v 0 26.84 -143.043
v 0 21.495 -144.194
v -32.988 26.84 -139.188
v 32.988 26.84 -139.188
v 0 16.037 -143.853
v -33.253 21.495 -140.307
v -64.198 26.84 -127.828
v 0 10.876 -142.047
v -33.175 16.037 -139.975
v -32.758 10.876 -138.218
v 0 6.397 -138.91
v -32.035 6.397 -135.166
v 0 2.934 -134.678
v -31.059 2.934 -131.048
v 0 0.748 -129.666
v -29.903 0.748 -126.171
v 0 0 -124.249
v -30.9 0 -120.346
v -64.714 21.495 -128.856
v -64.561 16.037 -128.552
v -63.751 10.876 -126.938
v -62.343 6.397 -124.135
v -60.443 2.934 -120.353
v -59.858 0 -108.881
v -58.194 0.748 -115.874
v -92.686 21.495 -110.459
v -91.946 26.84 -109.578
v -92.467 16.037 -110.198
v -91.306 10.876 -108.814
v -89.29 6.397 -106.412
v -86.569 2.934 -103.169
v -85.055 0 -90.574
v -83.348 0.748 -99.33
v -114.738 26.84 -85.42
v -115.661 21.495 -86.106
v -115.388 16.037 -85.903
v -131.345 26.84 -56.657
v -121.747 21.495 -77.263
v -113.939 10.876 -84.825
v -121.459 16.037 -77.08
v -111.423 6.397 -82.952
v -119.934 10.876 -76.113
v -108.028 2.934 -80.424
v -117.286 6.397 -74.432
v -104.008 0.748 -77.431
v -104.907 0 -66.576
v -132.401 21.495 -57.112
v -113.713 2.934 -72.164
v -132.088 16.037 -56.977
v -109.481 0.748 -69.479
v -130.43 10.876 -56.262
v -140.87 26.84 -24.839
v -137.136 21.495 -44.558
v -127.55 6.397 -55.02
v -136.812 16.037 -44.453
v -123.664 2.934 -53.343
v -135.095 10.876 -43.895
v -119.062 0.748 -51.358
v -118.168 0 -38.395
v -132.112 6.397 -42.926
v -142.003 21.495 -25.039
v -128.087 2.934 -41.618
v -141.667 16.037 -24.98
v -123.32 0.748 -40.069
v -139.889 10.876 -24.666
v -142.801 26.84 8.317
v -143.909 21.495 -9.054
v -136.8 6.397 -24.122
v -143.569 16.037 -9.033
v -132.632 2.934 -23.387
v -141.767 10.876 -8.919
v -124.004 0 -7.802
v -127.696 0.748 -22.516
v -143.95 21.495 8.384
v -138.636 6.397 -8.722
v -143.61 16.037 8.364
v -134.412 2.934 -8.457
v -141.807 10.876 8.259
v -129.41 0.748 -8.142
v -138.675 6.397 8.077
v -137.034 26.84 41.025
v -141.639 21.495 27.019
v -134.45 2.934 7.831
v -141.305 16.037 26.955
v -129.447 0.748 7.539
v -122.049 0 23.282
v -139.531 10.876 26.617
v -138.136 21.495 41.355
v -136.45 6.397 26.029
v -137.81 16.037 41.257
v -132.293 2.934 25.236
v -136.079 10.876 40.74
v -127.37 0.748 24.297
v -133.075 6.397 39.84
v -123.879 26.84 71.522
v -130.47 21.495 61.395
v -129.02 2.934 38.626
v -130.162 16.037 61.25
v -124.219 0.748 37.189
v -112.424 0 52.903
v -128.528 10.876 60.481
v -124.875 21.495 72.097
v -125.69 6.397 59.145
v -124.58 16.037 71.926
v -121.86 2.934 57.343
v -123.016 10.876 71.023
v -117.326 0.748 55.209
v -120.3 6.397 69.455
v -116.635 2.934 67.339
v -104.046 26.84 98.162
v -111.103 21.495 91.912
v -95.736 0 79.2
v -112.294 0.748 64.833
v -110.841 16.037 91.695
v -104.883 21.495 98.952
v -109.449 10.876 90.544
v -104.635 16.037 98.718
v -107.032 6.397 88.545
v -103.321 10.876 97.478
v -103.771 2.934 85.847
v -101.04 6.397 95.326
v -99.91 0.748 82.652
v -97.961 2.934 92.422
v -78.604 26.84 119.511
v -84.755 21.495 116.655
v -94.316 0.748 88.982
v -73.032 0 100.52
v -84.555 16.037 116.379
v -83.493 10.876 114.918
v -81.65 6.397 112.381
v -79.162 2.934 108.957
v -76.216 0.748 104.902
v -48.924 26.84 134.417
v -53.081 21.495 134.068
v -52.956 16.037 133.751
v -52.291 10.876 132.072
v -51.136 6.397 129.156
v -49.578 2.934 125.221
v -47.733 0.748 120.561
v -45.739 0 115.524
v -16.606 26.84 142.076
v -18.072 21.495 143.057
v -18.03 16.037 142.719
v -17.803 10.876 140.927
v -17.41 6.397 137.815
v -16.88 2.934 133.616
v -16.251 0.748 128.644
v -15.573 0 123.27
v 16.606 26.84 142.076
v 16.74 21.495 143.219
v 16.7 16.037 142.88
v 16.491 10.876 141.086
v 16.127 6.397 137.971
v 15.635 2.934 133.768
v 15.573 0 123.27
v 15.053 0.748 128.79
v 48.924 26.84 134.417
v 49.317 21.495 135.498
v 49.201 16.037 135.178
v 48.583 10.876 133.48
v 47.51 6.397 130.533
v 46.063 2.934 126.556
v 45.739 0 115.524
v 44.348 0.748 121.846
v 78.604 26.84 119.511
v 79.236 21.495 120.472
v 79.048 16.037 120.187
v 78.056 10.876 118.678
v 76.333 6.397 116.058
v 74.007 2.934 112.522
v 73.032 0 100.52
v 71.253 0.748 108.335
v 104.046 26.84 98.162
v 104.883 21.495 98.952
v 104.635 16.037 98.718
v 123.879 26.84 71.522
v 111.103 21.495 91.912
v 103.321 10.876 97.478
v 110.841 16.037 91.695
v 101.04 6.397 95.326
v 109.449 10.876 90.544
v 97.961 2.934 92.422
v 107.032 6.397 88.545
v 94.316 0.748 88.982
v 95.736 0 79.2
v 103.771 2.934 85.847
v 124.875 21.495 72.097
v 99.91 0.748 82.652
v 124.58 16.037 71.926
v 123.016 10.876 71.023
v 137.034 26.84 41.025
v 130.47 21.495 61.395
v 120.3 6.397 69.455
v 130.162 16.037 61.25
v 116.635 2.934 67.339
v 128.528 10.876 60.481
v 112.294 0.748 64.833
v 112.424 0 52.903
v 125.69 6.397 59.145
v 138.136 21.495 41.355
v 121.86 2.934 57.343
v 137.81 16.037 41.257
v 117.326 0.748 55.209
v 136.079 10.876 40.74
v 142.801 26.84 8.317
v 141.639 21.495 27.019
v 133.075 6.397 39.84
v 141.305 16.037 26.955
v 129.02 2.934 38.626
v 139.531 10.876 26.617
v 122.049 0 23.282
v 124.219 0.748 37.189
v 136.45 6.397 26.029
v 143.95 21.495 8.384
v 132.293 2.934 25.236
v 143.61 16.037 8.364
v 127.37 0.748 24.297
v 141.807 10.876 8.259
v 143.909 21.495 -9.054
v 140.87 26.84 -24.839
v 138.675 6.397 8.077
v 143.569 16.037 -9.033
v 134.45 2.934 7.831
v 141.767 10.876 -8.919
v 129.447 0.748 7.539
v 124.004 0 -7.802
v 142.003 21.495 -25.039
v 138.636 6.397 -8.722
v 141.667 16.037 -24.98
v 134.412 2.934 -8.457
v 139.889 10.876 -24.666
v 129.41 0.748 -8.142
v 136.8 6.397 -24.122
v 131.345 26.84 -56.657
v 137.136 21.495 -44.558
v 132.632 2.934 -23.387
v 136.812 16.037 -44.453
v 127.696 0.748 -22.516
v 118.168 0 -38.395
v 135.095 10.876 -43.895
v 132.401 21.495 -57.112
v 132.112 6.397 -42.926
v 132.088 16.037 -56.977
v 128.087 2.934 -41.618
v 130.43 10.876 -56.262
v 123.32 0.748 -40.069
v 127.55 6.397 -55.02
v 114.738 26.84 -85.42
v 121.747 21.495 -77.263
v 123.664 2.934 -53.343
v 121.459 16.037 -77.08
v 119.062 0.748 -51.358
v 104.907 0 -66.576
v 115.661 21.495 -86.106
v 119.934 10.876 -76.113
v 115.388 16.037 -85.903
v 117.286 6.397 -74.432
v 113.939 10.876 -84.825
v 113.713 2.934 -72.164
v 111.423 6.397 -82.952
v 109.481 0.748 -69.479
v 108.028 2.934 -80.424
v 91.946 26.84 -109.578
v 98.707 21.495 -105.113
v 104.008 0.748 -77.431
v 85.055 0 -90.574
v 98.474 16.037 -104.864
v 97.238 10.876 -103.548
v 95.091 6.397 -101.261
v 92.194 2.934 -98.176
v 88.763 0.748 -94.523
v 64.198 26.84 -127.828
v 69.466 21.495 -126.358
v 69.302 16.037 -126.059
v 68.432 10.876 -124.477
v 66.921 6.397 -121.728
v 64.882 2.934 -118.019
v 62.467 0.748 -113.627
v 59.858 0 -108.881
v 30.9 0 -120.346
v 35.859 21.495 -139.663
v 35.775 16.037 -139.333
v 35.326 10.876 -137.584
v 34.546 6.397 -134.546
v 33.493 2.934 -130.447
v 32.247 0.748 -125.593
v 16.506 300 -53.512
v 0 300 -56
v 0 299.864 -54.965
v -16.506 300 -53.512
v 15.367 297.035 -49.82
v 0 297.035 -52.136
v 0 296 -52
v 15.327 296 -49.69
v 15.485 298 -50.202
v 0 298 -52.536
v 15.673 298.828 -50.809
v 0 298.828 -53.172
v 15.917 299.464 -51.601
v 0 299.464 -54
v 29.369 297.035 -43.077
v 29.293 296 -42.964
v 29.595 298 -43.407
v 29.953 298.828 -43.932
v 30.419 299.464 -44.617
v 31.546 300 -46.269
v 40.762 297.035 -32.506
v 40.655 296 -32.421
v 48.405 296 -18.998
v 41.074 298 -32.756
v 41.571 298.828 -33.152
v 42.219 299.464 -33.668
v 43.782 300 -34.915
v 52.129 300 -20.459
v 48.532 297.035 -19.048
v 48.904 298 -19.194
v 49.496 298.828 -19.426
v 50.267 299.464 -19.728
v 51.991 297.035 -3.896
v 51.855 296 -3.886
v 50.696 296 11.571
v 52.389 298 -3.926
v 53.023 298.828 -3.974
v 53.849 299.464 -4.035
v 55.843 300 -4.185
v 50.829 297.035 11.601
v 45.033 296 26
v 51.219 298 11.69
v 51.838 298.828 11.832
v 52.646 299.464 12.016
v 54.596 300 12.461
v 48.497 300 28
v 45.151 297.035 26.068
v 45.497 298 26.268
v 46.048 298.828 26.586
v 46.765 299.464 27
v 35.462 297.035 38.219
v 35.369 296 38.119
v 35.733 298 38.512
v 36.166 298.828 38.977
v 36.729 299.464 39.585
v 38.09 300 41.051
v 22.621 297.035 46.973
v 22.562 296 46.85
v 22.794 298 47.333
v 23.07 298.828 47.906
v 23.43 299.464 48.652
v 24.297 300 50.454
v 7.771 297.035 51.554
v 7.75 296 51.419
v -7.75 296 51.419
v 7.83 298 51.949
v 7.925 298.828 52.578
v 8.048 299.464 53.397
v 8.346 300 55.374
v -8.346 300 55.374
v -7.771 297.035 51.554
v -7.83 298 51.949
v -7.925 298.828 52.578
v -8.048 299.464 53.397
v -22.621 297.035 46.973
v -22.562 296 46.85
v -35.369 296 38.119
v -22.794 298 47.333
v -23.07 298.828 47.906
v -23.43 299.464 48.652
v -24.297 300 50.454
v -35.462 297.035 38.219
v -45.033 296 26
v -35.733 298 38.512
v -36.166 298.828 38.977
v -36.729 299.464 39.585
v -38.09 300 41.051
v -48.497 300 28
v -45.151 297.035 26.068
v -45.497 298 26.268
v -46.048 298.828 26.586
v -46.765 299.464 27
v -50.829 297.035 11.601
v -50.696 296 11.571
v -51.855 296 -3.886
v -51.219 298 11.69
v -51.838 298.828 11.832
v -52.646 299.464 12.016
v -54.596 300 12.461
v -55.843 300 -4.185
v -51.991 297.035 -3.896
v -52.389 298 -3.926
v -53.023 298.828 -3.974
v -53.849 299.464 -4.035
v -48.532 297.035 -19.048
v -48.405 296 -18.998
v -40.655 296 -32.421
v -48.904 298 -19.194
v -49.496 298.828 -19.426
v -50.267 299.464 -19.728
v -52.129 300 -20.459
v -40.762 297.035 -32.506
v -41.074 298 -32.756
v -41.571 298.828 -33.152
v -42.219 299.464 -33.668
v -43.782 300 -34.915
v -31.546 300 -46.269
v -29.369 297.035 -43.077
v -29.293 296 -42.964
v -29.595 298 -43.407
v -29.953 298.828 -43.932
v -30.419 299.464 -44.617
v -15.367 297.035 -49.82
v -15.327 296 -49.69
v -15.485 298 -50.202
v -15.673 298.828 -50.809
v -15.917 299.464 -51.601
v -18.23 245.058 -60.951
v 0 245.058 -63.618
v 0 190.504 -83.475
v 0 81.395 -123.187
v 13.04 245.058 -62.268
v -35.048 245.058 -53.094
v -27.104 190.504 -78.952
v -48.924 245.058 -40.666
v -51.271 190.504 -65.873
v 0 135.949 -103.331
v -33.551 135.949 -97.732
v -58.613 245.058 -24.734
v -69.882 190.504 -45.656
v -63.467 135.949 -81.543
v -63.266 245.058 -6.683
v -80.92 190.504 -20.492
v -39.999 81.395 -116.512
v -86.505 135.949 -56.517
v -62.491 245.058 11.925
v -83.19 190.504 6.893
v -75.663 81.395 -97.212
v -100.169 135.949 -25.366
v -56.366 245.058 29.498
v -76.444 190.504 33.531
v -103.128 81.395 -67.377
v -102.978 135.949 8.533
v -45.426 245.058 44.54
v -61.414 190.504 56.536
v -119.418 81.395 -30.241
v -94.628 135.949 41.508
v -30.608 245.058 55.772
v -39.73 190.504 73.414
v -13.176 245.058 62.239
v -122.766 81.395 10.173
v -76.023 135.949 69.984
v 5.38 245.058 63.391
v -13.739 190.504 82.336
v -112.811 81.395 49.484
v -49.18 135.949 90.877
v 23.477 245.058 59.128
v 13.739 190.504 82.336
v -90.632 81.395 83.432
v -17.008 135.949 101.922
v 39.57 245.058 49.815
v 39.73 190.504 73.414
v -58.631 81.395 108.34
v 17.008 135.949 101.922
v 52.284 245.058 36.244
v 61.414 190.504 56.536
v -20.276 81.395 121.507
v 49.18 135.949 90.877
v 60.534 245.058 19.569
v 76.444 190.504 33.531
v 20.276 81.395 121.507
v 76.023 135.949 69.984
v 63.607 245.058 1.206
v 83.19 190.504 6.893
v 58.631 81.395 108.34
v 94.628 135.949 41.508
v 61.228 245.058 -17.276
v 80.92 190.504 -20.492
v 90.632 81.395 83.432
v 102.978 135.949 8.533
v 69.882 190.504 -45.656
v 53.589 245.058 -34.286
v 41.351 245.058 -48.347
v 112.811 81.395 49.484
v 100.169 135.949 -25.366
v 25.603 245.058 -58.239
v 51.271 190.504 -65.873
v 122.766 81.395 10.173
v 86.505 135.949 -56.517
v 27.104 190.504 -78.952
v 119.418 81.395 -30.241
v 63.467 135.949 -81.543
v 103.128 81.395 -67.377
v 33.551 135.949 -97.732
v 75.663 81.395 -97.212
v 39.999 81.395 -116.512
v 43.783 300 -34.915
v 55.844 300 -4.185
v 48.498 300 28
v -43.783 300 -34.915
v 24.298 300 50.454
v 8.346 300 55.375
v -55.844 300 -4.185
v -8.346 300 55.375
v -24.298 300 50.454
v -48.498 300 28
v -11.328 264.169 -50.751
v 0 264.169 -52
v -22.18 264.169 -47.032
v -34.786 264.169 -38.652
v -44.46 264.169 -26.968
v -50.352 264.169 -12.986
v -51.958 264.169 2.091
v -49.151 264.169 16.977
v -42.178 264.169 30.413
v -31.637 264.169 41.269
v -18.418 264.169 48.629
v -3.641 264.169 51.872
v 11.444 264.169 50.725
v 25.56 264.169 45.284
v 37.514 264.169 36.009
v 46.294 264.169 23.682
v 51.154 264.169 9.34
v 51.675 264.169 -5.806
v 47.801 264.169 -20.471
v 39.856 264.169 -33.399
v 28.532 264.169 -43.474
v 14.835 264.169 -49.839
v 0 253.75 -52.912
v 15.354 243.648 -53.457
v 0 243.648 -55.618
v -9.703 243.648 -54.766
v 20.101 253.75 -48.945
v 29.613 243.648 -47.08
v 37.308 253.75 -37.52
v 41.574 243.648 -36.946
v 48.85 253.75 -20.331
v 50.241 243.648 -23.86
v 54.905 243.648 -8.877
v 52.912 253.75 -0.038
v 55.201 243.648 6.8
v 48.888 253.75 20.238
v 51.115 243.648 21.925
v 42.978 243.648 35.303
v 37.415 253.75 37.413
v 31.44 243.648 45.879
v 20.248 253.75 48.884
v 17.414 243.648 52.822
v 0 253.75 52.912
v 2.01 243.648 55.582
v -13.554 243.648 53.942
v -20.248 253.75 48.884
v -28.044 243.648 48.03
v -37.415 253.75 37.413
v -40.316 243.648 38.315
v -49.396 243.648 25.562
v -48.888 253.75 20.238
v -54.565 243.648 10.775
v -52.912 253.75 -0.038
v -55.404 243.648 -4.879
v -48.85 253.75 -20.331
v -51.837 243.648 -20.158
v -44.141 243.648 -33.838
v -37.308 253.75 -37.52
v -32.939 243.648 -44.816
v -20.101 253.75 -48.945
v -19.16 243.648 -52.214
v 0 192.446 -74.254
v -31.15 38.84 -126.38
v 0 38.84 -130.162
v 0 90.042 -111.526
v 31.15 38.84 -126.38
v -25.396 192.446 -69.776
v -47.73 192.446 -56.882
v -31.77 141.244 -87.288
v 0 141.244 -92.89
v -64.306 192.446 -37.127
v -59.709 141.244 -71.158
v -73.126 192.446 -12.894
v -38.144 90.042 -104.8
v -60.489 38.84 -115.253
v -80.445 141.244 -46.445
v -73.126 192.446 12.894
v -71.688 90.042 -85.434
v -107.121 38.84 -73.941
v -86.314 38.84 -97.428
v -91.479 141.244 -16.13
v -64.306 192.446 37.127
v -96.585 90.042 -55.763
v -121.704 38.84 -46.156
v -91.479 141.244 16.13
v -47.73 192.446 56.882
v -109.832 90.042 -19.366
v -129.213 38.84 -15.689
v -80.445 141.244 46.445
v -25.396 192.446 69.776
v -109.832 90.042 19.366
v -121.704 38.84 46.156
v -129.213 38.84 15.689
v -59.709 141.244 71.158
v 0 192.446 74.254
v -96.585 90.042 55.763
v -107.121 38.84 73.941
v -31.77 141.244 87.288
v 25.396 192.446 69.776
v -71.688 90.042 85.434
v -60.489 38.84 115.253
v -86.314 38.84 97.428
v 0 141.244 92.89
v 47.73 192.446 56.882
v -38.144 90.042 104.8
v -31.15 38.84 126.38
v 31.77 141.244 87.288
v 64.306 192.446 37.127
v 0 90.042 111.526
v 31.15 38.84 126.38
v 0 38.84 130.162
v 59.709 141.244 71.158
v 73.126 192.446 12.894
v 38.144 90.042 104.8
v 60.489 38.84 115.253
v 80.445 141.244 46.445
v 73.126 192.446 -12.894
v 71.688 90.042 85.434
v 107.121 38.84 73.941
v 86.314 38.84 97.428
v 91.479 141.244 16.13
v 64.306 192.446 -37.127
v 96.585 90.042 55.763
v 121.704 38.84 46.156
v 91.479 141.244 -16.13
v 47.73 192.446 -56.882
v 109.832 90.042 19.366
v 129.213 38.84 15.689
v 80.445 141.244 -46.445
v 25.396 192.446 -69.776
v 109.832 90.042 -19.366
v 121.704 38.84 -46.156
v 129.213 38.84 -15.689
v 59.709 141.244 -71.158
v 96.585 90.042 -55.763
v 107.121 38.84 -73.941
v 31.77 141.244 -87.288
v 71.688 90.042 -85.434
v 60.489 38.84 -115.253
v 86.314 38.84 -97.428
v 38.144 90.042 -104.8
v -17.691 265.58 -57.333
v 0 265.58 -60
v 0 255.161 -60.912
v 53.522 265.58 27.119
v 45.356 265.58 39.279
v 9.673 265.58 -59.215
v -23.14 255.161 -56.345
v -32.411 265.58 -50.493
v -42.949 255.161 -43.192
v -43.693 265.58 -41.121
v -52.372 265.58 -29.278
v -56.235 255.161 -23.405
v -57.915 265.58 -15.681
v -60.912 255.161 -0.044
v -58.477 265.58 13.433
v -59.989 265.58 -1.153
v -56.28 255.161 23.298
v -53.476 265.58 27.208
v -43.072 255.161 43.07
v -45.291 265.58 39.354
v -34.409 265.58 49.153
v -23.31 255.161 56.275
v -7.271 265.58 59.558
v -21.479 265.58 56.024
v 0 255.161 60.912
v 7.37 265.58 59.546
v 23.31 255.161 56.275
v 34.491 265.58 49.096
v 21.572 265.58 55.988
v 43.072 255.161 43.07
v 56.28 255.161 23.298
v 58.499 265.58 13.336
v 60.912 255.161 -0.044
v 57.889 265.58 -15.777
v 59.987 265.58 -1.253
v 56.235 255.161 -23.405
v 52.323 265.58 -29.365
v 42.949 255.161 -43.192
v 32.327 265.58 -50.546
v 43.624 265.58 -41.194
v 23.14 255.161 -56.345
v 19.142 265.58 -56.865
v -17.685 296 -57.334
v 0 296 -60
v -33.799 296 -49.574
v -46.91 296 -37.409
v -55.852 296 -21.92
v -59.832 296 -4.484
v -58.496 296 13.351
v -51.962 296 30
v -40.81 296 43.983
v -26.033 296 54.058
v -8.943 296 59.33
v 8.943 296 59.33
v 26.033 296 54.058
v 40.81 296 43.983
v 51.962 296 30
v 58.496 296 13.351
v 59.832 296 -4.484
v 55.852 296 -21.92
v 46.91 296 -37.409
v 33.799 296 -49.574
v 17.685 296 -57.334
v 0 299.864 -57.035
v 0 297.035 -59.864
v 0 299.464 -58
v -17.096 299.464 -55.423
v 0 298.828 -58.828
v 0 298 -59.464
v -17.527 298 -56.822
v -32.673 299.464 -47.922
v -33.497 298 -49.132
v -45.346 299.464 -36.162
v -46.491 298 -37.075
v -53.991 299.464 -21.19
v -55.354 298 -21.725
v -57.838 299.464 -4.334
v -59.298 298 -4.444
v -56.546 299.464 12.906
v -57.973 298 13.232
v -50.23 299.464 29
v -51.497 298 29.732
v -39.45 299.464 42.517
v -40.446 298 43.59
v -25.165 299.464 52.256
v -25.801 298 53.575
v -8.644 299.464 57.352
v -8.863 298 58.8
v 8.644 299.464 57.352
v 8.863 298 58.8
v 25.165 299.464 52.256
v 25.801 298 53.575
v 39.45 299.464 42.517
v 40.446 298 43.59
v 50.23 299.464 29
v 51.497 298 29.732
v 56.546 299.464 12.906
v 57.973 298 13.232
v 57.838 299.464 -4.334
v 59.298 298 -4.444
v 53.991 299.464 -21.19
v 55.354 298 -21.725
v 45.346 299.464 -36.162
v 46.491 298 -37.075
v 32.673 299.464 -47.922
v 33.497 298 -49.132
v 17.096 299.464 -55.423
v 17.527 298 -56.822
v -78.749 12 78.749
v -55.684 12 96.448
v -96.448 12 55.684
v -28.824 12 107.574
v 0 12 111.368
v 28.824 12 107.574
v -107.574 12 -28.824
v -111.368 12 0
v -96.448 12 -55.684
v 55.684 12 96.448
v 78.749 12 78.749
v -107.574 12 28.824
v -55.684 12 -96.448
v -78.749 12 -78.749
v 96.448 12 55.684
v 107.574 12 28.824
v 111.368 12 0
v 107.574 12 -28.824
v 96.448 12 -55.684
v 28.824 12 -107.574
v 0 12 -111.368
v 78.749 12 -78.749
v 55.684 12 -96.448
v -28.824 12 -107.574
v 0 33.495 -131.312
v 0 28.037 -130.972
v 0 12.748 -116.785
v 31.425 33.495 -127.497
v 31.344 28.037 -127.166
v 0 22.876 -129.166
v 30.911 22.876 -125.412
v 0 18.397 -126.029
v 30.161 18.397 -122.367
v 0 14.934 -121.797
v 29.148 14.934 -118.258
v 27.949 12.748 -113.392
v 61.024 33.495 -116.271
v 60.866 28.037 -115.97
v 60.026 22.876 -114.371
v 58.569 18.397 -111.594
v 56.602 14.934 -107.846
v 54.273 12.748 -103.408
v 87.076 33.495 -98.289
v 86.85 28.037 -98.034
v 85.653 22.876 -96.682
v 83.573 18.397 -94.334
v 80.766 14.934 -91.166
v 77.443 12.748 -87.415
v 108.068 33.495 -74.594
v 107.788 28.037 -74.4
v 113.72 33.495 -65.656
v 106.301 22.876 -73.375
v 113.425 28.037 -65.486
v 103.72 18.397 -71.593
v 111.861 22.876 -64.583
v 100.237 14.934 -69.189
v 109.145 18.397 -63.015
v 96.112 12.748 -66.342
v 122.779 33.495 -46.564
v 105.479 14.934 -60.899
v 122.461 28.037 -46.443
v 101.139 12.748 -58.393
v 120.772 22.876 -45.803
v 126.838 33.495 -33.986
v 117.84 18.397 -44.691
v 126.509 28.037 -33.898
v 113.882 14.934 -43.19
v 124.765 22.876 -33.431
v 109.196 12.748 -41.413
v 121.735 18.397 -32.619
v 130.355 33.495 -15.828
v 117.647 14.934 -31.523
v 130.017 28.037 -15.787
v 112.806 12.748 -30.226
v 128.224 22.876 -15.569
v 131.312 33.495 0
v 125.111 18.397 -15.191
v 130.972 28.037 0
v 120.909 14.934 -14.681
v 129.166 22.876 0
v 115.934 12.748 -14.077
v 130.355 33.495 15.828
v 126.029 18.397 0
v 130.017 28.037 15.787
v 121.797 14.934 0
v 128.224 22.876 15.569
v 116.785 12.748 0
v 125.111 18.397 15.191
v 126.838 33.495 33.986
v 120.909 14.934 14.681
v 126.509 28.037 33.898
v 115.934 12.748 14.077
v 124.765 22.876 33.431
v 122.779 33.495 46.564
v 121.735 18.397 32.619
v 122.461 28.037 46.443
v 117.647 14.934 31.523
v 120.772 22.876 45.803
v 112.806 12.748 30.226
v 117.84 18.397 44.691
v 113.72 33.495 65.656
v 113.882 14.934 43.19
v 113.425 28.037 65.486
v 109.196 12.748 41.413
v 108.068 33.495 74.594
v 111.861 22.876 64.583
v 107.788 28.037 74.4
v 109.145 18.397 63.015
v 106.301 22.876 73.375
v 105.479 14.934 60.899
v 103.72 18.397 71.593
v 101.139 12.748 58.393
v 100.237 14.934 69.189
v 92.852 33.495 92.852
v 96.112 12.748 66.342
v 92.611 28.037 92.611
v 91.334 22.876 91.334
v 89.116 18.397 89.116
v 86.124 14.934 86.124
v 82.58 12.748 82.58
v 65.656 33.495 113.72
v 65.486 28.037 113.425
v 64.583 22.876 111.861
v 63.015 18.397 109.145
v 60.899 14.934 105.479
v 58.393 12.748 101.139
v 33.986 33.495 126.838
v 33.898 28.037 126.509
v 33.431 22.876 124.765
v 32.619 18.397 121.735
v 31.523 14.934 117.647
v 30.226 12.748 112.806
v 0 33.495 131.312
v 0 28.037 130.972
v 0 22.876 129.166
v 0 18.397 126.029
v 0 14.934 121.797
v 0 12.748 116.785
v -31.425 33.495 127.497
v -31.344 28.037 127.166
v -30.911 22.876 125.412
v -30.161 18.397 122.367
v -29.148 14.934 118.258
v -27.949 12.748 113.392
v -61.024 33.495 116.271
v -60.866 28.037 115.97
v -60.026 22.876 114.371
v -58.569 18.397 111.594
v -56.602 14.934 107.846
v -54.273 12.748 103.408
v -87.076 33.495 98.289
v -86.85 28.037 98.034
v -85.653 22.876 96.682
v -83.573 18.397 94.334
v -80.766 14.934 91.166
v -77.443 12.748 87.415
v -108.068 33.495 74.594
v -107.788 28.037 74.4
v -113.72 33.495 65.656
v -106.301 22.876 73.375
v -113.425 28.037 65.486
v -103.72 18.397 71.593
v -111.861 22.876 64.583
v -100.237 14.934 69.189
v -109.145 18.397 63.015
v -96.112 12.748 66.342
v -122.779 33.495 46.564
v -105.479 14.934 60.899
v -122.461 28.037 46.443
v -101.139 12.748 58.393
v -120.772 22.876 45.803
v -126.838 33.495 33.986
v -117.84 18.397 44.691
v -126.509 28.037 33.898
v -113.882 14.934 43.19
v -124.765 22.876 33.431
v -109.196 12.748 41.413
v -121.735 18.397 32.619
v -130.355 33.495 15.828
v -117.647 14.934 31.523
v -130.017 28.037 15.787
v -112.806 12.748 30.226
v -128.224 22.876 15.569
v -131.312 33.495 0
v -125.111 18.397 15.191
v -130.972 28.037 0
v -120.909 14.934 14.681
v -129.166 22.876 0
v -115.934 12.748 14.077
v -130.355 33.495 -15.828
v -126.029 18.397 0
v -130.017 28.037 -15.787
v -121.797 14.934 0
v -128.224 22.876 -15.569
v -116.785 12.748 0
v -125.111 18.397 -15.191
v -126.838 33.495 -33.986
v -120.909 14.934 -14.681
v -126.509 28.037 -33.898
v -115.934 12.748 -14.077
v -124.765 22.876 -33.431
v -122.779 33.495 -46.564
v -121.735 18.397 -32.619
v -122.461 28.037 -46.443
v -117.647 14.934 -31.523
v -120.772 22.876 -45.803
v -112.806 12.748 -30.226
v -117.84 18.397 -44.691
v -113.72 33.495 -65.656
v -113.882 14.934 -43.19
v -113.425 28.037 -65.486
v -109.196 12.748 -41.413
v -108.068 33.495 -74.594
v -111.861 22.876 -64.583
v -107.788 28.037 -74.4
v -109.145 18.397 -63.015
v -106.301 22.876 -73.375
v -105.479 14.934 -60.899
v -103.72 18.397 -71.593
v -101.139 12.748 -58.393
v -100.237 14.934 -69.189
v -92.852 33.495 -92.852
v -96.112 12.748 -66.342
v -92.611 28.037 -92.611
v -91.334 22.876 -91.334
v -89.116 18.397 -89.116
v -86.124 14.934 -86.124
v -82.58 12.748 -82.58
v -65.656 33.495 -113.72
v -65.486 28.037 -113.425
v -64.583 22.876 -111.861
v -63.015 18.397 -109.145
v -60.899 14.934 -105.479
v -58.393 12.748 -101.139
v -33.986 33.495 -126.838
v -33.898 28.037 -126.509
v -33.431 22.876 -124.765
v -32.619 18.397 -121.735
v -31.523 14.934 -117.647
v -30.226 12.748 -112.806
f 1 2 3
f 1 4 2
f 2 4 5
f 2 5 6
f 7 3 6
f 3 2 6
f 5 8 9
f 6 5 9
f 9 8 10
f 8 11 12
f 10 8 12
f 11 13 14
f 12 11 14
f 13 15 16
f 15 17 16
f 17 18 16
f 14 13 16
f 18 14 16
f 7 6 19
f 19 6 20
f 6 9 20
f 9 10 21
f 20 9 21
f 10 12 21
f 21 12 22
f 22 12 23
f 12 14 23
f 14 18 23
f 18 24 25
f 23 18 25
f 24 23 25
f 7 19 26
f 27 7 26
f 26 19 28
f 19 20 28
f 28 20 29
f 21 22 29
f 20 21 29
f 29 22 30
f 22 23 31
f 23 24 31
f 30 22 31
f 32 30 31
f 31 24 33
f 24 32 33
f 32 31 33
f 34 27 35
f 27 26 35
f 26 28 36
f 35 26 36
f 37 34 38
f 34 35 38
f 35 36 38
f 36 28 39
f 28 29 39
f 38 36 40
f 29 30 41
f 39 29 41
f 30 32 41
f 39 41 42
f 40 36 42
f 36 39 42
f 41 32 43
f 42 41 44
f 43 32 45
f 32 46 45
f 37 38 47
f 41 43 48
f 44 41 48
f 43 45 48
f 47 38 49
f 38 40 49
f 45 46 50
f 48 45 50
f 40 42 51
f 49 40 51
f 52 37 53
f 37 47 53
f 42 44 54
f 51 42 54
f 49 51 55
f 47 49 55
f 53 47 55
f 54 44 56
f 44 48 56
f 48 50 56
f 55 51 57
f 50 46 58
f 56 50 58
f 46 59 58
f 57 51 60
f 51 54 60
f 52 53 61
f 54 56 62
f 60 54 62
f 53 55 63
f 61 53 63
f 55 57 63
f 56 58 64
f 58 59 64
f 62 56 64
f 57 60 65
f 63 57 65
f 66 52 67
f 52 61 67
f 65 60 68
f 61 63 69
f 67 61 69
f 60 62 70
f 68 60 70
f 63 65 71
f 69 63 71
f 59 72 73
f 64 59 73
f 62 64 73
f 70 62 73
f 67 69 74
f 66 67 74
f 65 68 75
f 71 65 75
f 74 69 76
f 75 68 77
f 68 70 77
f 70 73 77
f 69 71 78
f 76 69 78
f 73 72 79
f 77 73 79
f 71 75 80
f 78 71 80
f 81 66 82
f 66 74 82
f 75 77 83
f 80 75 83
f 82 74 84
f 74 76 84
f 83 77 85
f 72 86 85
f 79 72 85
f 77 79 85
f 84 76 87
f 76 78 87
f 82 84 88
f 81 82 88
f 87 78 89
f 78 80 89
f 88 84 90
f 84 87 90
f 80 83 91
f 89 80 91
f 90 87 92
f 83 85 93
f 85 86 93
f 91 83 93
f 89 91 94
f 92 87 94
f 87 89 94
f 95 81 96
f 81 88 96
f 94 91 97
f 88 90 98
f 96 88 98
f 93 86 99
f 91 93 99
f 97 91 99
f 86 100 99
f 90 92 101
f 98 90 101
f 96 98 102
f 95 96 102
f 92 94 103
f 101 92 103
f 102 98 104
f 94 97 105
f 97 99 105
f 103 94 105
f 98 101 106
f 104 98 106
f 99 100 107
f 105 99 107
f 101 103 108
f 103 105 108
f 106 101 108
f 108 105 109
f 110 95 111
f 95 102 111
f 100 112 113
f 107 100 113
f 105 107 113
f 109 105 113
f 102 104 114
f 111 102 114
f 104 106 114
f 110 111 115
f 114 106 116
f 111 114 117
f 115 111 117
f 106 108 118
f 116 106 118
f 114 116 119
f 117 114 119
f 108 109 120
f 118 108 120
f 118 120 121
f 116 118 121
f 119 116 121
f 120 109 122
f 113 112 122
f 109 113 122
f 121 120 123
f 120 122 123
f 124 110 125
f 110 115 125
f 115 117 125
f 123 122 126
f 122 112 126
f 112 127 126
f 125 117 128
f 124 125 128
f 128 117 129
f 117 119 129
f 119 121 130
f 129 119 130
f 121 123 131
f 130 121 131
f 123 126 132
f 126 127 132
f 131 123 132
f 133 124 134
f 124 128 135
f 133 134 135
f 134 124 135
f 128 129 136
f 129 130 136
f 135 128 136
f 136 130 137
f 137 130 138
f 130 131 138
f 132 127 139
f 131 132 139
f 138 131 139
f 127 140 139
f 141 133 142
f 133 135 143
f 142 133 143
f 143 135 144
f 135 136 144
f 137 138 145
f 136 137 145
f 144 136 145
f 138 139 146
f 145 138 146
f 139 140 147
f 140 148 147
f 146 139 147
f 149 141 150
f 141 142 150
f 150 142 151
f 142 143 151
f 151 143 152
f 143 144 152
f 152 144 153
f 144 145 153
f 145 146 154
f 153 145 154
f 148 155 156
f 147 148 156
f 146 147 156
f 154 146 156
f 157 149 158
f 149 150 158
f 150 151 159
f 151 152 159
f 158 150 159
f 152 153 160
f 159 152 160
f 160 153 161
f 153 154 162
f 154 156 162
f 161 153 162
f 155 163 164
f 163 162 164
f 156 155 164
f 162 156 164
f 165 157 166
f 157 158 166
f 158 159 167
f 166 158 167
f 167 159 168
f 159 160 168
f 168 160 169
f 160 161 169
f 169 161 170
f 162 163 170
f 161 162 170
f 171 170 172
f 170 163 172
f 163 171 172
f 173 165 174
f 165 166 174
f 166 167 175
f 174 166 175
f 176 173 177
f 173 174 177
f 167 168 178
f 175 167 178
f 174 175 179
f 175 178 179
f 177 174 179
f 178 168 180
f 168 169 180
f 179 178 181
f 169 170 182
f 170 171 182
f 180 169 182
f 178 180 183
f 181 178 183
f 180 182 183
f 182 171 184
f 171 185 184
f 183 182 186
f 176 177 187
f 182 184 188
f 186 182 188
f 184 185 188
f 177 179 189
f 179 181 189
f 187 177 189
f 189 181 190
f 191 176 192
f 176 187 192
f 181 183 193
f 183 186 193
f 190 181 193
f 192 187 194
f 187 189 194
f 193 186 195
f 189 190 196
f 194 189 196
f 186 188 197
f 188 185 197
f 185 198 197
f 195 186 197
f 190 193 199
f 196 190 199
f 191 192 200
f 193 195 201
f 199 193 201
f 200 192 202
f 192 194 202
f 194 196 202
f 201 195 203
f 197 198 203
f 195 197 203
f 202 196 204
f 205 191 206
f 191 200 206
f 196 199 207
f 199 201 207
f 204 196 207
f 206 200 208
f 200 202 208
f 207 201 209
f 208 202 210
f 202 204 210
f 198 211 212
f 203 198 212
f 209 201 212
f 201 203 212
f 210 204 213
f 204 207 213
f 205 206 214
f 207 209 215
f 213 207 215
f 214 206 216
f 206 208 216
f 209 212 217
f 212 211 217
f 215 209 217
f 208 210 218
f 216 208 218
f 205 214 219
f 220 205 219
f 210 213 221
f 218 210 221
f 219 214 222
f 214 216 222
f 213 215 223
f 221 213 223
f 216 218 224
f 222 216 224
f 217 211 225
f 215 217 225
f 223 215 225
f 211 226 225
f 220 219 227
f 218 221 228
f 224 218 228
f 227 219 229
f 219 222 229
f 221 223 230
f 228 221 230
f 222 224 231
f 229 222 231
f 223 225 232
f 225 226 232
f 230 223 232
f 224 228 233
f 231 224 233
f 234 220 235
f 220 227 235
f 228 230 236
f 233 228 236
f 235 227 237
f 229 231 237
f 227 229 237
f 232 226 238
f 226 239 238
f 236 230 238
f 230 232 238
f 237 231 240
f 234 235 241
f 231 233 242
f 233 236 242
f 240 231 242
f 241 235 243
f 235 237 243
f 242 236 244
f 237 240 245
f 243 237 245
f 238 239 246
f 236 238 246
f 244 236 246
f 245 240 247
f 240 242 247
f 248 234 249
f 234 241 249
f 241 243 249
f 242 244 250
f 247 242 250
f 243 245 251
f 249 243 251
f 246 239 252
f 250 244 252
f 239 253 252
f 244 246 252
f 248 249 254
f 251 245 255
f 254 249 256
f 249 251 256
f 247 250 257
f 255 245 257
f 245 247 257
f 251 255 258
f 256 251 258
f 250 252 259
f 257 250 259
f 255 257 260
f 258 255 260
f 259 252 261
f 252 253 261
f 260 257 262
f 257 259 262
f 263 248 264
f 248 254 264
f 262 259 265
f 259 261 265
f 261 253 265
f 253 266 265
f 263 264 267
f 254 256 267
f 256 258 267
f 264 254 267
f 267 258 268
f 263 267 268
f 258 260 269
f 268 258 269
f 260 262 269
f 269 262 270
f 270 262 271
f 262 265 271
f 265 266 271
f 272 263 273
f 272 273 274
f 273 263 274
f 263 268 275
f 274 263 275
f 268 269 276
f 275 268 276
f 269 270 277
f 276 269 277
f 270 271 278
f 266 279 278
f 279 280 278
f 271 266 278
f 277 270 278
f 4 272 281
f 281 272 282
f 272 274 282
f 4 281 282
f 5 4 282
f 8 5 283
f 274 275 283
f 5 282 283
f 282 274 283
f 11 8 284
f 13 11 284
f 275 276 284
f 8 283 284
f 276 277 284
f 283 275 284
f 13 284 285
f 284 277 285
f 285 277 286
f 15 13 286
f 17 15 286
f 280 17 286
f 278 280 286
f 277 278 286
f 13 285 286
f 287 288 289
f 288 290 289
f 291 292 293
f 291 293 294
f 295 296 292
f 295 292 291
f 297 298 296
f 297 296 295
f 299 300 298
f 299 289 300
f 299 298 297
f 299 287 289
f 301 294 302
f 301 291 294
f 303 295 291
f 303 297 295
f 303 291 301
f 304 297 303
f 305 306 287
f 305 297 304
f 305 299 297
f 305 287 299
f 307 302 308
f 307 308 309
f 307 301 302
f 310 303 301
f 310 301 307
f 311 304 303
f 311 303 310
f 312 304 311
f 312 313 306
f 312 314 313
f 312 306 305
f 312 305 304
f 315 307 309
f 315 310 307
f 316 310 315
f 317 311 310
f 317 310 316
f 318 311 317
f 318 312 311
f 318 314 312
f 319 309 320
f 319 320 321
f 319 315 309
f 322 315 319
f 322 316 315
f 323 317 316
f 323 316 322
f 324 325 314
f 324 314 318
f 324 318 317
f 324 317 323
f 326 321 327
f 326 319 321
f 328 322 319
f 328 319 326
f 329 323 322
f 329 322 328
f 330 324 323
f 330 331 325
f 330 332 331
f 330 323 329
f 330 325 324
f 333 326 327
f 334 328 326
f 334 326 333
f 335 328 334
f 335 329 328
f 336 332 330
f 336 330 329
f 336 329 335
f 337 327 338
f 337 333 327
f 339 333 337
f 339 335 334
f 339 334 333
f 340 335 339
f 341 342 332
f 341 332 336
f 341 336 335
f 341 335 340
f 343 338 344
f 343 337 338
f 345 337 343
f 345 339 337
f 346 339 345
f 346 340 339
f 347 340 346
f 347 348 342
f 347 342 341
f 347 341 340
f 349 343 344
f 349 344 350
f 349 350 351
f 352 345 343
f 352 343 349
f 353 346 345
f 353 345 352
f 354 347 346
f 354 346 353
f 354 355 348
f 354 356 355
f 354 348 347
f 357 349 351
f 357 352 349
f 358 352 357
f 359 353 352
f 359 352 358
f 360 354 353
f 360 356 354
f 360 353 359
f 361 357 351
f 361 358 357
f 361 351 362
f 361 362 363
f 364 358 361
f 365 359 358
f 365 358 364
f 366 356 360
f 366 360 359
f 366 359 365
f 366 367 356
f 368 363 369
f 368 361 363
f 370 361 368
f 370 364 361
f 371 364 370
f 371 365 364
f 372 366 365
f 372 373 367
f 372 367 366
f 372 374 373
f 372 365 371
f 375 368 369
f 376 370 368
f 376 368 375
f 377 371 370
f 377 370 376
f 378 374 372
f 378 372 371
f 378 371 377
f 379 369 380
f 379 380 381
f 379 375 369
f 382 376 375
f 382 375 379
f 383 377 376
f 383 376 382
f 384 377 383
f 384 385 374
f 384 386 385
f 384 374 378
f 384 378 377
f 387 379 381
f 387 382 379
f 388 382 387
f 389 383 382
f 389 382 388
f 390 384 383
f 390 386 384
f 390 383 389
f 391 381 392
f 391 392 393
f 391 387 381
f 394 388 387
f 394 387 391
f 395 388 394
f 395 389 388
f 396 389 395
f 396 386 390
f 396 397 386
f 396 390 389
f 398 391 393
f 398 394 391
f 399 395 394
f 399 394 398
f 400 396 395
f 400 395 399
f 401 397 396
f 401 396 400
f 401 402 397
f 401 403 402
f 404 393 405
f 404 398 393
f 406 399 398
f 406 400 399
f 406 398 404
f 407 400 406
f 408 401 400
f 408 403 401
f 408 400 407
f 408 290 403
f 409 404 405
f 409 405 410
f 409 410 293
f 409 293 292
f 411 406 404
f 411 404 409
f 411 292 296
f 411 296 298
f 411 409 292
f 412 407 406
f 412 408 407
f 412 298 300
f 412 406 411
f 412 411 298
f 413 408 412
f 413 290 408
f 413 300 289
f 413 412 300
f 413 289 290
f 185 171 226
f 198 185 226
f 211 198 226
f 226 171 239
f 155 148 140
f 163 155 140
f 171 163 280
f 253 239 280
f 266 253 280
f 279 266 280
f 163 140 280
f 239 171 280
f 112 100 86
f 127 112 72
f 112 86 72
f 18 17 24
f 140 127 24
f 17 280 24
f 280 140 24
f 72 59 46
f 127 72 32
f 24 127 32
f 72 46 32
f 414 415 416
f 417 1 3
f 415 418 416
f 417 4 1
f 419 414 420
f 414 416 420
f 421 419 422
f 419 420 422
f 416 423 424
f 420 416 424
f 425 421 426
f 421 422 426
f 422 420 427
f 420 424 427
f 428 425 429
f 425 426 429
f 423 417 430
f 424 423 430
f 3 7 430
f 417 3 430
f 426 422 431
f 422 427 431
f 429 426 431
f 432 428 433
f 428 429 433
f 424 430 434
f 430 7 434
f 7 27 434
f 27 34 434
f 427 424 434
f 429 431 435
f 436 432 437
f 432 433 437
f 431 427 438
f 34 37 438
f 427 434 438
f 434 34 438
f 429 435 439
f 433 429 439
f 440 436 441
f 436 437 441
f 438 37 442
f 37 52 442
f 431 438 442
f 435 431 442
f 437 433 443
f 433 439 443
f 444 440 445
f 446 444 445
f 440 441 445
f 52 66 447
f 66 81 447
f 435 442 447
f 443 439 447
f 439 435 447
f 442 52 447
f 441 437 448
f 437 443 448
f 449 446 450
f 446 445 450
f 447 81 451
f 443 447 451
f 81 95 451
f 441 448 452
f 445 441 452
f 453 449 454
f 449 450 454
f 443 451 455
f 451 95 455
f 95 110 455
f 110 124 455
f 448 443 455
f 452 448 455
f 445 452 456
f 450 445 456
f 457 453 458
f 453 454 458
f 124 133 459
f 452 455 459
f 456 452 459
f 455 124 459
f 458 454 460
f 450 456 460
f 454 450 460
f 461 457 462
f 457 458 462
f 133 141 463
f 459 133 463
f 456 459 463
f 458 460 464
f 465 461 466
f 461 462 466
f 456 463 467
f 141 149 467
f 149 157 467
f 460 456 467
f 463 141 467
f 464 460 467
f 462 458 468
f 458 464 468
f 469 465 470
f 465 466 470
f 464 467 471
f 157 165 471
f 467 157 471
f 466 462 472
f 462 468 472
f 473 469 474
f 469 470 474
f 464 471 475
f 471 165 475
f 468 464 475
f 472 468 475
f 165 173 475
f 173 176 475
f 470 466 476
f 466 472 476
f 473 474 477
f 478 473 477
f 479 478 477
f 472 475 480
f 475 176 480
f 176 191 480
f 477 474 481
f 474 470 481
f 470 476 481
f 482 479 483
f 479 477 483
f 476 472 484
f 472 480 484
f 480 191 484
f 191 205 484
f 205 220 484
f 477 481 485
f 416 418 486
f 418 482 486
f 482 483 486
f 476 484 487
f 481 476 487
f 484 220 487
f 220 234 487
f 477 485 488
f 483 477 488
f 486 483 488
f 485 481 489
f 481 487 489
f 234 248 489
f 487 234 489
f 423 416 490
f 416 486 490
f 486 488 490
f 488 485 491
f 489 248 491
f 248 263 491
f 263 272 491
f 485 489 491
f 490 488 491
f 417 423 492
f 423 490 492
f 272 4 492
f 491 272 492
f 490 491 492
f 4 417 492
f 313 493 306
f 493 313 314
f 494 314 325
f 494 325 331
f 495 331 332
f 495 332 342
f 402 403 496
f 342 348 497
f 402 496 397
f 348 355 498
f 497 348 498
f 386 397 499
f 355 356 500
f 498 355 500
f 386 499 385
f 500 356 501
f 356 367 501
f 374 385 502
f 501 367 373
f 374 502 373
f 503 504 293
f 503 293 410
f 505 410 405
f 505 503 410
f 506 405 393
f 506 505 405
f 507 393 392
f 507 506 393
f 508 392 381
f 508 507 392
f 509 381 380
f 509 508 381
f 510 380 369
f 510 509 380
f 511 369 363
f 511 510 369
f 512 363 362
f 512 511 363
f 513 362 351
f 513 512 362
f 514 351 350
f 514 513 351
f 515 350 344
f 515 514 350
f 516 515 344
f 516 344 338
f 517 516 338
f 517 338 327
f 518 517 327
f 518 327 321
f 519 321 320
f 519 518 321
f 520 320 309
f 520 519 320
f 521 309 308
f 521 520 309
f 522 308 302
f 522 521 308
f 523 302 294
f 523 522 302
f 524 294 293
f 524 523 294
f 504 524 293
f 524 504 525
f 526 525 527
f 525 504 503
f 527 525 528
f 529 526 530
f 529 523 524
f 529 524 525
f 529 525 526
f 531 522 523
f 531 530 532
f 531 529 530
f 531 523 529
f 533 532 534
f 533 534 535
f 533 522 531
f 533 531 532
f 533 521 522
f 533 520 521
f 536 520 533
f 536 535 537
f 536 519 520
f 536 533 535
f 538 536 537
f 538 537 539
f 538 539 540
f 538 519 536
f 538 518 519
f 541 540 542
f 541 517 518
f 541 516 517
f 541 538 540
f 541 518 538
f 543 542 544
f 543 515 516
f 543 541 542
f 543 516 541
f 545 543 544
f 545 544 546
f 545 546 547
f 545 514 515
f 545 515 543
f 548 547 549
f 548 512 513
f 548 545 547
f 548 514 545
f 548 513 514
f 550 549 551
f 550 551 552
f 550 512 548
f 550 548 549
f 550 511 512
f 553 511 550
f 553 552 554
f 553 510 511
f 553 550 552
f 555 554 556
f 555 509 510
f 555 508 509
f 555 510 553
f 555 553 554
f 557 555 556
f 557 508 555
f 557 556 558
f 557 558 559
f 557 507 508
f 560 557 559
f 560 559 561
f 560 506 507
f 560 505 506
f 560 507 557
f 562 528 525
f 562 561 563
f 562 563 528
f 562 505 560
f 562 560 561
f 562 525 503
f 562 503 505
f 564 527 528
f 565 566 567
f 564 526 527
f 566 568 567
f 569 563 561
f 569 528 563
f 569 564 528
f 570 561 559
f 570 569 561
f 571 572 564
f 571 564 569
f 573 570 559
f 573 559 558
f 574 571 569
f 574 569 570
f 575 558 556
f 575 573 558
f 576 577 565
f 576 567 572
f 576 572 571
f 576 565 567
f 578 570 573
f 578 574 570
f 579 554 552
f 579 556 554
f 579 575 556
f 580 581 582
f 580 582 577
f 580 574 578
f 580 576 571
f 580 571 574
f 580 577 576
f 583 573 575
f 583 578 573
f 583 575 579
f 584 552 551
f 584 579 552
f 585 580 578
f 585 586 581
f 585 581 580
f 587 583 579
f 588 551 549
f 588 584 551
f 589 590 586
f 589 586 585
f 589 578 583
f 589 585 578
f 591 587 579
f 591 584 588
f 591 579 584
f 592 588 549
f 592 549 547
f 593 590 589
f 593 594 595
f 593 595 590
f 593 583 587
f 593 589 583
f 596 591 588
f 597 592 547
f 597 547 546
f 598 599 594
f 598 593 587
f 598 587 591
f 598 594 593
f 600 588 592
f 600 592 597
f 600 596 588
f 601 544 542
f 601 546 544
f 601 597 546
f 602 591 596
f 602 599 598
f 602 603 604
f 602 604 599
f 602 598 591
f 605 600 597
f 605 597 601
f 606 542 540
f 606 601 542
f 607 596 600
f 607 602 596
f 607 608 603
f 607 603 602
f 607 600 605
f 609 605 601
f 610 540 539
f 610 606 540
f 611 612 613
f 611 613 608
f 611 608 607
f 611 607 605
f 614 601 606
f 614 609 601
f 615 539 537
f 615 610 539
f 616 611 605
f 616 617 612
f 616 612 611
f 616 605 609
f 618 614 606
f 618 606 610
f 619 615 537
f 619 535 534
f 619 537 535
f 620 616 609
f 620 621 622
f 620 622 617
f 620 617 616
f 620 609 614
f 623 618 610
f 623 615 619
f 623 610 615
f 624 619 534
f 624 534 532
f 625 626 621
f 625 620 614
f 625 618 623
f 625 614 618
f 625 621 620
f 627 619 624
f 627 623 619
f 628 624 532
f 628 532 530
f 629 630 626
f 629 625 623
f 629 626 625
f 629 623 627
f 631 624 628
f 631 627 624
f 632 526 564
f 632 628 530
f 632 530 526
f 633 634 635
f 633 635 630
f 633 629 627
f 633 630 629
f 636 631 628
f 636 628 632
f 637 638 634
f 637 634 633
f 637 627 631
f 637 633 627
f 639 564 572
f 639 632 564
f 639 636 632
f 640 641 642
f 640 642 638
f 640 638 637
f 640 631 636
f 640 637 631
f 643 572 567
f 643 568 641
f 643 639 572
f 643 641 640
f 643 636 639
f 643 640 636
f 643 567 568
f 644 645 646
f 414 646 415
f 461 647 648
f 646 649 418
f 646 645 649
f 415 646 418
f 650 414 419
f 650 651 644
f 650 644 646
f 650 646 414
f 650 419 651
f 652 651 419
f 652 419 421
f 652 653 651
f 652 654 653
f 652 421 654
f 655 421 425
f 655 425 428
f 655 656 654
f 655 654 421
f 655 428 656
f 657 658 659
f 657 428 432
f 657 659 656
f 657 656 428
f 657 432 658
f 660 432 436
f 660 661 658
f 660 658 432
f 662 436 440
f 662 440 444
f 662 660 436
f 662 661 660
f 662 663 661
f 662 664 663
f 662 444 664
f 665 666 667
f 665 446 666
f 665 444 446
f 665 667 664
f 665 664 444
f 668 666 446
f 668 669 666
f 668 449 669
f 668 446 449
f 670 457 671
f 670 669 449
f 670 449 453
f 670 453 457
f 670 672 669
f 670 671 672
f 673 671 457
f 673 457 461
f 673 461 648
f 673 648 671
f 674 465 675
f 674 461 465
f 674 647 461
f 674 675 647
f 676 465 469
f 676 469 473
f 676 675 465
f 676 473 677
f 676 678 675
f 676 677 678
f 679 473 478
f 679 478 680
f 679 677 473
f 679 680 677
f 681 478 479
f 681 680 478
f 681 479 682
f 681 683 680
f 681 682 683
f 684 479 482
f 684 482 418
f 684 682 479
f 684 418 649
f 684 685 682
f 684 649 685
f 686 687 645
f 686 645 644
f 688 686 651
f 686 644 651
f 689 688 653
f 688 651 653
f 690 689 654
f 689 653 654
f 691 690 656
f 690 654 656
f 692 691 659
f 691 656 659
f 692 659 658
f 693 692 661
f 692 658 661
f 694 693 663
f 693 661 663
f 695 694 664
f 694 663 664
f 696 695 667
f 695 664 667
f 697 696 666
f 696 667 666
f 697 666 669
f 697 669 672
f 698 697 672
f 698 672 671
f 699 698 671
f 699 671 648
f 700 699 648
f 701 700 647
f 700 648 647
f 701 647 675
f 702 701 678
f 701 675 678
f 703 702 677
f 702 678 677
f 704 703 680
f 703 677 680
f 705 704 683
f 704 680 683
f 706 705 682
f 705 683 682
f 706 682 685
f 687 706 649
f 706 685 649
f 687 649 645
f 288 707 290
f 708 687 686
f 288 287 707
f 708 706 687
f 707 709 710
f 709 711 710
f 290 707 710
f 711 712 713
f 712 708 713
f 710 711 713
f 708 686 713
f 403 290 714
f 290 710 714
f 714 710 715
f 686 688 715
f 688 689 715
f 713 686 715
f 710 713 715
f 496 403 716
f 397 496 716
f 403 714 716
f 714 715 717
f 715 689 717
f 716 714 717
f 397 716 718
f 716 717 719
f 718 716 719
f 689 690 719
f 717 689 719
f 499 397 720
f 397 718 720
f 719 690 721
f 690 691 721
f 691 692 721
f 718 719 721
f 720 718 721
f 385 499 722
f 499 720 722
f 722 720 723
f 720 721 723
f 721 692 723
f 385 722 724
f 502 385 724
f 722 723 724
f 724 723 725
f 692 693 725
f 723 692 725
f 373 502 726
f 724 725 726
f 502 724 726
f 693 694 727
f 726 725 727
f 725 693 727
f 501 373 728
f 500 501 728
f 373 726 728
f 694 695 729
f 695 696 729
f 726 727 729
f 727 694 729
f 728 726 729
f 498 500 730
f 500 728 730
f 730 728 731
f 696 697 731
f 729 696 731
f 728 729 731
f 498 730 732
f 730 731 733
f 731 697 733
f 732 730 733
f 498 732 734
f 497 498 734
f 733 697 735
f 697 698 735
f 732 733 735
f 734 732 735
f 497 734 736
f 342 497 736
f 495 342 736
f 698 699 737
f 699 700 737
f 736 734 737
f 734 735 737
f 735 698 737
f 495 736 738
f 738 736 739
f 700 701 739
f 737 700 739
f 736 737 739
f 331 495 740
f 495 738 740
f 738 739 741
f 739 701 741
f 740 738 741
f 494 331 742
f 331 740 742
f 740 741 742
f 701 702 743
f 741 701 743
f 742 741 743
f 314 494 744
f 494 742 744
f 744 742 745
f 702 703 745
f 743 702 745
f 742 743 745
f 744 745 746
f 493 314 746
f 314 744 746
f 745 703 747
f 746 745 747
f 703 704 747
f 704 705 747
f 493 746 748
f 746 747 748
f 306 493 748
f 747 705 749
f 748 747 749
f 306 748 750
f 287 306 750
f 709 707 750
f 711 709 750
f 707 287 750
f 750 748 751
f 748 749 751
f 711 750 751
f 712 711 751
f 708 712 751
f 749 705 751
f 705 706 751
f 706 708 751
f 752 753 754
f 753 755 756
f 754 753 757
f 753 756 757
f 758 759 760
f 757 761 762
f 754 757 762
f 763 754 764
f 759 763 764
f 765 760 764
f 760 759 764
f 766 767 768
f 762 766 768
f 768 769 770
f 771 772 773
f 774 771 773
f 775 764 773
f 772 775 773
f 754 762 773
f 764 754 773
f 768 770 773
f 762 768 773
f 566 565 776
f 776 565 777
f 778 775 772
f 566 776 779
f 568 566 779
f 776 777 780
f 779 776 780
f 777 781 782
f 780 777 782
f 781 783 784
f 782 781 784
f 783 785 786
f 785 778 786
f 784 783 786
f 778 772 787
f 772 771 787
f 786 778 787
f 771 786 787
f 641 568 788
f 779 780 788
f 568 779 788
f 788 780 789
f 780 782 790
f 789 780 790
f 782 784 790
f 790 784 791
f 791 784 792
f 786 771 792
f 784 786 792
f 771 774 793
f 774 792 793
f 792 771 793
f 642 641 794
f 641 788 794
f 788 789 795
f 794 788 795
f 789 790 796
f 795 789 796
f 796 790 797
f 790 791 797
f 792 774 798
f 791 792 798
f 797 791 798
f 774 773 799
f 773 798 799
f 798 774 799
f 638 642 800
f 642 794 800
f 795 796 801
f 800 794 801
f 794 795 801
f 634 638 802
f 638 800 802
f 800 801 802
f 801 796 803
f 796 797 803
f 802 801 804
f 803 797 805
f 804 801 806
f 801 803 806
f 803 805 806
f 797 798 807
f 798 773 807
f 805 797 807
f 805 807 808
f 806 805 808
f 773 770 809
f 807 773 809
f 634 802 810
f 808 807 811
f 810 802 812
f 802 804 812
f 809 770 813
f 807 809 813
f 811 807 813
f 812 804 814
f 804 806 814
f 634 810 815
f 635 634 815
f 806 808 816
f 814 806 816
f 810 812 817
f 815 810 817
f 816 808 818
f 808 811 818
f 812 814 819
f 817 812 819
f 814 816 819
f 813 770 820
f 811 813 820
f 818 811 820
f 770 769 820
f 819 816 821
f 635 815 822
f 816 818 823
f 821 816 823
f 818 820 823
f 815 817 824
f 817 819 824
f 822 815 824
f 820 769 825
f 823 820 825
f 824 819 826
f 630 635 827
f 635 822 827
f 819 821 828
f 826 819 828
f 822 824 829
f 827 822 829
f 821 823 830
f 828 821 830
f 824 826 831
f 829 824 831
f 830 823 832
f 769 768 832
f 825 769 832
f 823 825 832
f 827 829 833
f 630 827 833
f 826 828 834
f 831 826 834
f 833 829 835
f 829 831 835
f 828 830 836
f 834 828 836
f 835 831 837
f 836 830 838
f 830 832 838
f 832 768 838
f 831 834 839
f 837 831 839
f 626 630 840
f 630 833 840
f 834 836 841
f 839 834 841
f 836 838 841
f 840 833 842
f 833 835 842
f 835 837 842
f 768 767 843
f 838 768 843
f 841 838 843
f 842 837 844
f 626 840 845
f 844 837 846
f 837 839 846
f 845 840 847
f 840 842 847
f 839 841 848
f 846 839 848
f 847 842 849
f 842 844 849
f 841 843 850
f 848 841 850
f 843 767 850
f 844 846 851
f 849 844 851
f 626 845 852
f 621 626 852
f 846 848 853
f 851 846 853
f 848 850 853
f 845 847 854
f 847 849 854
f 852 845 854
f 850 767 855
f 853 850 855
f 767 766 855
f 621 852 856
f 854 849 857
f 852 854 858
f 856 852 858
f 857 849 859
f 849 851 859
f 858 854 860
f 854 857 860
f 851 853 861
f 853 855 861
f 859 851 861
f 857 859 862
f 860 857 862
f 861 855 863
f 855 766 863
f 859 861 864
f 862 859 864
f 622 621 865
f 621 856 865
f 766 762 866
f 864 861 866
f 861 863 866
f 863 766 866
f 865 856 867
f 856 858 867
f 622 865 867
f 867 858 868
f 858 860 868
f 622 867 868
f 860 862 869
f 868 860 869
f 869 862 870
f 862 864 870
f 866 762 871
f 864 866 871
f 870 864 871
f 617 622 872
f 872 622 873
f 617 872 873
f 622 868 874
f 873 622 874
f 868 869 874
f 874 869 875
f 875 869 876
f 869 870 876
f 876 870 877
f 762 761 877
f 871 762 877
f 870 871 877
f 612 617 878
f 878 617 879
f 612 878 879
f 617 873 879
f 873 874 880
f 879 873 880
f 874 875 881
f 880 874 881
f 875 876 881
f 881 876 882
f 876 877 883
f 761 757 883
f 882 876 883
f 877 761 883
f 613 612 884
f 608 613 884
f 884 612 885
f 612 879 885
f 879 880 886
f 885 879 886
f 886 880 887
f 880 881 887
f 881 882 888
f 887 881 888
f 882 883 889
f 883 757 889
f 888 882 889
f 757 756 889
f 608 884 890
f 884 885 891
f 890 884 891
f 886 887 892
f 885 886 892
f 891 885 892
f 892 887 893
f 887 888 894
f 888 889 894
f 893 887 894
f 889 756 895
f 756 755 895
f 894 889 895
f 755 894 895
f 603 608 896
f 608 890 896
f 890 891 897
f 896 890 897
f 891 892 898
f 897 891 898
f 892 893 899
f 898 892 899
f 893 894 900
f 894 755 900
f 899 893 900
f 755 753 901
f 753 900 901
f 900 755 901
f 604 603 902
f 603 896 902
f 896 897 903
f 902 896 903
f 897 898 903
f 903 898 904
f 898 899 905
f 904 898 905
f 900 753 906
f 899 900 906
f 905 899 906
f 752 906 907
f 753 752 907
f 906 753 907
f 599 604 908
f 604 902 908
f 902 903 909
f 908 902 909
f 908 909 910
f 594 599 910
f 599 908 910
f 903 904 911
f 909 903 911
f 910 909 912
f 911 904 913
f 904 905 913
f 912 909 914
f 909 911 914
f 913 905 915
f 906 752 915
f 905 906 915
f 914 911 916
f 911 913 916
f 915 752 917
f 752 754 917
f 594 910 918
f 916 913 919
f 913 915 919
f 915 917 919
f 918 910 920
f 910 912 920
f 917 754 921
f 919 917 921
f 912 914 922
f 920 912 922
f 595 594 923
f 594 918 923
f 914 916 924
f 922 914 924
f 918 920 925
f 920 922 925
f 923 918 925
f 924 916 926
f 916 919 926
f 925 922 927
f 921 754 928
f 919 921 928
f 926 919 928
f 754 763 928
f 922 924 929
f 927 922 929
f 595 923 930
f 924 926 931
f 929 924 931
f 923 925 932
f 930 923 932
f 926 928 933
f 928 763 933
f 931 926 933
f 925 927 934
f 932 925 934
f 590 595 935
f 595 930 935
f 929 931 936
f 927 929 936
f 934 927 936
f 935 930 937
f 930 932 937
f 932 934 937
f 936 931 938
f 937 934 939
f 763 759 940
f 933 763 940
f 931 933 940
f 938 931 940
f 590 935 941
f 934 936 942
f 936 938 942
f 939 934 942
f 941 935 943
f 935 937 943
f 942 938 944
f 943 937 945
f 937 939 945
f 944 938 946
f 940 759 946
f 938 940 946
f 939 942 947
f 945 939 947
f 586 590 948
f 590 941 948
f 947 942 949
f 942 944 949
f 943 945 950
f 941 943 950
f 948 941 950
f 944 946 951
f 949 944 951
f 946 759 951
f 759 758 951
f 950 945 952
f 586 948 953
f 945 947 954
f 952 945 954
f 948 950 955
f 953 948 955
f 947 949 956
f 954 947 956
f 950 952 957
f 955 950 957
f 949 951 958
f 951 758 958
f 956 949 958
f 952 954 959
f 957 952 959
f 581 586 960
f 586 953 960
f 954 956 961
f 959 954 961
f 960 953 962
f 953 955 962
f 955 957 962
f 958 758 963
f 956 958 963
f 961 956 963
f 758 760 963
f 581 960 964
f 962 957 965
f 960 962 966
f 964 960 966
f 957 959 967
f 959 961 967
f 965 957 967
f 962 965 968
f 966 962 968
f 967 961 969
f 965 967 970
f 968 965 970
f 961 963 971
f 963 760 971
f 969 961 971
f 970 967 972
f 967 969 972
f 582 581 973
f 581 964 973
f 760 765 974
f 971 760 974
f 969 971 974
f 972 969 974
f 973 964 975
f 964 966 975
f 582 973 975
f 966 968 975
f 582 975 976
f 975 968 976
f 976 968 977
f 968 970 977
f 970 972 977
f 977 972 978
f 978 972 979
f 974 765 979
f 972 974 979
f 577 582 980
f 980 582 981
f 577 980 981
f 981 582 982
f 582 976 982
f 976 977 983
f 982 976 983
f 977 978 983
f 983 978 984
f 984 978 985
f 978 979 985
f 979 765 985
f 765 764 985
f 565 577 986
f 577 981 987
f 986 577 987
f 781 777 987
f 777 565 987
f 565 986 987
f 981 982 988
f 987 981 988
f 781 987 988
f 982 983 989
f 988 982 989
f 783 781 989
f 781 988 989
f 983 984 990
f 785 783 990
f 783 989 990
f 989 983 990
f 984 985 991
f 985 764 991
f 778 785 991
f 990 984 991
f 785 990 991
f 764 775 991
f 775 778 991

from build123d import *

# Parameters (mm, degrees)
SHELL1_T                  = -8
SHELL1_THICKNESS_2_FACE_R = 141.387225684
SHELL1_THICKNESS_2_DEPTH  = 4
FILLET1_R                 = 4
FILLET2_R                 = 60
FILLET3_R                 = 20


with BuildPart() as part:
    # Sketch1 → Revolve2 (revolve)
    with BuildSketch(Plane.XY, mode=Mode.PRIVATE) as revolve2_sk:
        Polygon((0, 0), (0, 300), (60, 300), (60, 255), (152.812409738, 0), align=None)
    revolve(revolve2_sk.sketch.rotate(Axis((0, 0, 0), (0, 1, 0)), 90), axis=Axis((0, 0, 0), (0, 1, 0)))

    # Shell1
    shell1_openings = [part.faces().sort_by_distance(p)[0] for p in [
        (0, 300, 0),
    ]]
    offset(amount=SHELL1_T, openings=shell1_openings, kind=Kind.INTERSECTION)

    # Shell1 thickness 2 face (on inner face of the shell) → Shell1 thickness 2 (add)
    with BuildSketch(Plane(origin=(0, 8, 0), x_dir=(0, 0, -1), z_dir=(0, -1, 0))):
        Circle(SHELL1_THICKNESS_2_FACE_R)
    extrude(amount=-SHELL1_THICKNESS_2_DEPTH)

    # Fillet1
    fillet1_edges = [part.edges().sort_by_distance(p)[0] for p in [
        (0, 300, 52),
        (0, 300, 60),
    ]]
    fillet(fillet1_edges, radius=FILLET1_R - 0.0001)  # a hair under: the kernel refuses the full size

    # Fillet2
    fillet2_edges = [part.edges().sort_by_distance(p)[0] for p in [
        (0, 253.589384154, 52),
        (0, 255, 60),
    ]]
    fillet(fillet2_edges, radius=FILLET2_R)

    # Fillet3
    fillet3_edges = [part.edges().sort_by_distance(p)[0] for p in [
        (0, 12, 139.931344747),
        (0, 0, 152.812409738),
    ]]
    fillet(fillet3_edges, radius=FILLET3_R)


solid = part.part
